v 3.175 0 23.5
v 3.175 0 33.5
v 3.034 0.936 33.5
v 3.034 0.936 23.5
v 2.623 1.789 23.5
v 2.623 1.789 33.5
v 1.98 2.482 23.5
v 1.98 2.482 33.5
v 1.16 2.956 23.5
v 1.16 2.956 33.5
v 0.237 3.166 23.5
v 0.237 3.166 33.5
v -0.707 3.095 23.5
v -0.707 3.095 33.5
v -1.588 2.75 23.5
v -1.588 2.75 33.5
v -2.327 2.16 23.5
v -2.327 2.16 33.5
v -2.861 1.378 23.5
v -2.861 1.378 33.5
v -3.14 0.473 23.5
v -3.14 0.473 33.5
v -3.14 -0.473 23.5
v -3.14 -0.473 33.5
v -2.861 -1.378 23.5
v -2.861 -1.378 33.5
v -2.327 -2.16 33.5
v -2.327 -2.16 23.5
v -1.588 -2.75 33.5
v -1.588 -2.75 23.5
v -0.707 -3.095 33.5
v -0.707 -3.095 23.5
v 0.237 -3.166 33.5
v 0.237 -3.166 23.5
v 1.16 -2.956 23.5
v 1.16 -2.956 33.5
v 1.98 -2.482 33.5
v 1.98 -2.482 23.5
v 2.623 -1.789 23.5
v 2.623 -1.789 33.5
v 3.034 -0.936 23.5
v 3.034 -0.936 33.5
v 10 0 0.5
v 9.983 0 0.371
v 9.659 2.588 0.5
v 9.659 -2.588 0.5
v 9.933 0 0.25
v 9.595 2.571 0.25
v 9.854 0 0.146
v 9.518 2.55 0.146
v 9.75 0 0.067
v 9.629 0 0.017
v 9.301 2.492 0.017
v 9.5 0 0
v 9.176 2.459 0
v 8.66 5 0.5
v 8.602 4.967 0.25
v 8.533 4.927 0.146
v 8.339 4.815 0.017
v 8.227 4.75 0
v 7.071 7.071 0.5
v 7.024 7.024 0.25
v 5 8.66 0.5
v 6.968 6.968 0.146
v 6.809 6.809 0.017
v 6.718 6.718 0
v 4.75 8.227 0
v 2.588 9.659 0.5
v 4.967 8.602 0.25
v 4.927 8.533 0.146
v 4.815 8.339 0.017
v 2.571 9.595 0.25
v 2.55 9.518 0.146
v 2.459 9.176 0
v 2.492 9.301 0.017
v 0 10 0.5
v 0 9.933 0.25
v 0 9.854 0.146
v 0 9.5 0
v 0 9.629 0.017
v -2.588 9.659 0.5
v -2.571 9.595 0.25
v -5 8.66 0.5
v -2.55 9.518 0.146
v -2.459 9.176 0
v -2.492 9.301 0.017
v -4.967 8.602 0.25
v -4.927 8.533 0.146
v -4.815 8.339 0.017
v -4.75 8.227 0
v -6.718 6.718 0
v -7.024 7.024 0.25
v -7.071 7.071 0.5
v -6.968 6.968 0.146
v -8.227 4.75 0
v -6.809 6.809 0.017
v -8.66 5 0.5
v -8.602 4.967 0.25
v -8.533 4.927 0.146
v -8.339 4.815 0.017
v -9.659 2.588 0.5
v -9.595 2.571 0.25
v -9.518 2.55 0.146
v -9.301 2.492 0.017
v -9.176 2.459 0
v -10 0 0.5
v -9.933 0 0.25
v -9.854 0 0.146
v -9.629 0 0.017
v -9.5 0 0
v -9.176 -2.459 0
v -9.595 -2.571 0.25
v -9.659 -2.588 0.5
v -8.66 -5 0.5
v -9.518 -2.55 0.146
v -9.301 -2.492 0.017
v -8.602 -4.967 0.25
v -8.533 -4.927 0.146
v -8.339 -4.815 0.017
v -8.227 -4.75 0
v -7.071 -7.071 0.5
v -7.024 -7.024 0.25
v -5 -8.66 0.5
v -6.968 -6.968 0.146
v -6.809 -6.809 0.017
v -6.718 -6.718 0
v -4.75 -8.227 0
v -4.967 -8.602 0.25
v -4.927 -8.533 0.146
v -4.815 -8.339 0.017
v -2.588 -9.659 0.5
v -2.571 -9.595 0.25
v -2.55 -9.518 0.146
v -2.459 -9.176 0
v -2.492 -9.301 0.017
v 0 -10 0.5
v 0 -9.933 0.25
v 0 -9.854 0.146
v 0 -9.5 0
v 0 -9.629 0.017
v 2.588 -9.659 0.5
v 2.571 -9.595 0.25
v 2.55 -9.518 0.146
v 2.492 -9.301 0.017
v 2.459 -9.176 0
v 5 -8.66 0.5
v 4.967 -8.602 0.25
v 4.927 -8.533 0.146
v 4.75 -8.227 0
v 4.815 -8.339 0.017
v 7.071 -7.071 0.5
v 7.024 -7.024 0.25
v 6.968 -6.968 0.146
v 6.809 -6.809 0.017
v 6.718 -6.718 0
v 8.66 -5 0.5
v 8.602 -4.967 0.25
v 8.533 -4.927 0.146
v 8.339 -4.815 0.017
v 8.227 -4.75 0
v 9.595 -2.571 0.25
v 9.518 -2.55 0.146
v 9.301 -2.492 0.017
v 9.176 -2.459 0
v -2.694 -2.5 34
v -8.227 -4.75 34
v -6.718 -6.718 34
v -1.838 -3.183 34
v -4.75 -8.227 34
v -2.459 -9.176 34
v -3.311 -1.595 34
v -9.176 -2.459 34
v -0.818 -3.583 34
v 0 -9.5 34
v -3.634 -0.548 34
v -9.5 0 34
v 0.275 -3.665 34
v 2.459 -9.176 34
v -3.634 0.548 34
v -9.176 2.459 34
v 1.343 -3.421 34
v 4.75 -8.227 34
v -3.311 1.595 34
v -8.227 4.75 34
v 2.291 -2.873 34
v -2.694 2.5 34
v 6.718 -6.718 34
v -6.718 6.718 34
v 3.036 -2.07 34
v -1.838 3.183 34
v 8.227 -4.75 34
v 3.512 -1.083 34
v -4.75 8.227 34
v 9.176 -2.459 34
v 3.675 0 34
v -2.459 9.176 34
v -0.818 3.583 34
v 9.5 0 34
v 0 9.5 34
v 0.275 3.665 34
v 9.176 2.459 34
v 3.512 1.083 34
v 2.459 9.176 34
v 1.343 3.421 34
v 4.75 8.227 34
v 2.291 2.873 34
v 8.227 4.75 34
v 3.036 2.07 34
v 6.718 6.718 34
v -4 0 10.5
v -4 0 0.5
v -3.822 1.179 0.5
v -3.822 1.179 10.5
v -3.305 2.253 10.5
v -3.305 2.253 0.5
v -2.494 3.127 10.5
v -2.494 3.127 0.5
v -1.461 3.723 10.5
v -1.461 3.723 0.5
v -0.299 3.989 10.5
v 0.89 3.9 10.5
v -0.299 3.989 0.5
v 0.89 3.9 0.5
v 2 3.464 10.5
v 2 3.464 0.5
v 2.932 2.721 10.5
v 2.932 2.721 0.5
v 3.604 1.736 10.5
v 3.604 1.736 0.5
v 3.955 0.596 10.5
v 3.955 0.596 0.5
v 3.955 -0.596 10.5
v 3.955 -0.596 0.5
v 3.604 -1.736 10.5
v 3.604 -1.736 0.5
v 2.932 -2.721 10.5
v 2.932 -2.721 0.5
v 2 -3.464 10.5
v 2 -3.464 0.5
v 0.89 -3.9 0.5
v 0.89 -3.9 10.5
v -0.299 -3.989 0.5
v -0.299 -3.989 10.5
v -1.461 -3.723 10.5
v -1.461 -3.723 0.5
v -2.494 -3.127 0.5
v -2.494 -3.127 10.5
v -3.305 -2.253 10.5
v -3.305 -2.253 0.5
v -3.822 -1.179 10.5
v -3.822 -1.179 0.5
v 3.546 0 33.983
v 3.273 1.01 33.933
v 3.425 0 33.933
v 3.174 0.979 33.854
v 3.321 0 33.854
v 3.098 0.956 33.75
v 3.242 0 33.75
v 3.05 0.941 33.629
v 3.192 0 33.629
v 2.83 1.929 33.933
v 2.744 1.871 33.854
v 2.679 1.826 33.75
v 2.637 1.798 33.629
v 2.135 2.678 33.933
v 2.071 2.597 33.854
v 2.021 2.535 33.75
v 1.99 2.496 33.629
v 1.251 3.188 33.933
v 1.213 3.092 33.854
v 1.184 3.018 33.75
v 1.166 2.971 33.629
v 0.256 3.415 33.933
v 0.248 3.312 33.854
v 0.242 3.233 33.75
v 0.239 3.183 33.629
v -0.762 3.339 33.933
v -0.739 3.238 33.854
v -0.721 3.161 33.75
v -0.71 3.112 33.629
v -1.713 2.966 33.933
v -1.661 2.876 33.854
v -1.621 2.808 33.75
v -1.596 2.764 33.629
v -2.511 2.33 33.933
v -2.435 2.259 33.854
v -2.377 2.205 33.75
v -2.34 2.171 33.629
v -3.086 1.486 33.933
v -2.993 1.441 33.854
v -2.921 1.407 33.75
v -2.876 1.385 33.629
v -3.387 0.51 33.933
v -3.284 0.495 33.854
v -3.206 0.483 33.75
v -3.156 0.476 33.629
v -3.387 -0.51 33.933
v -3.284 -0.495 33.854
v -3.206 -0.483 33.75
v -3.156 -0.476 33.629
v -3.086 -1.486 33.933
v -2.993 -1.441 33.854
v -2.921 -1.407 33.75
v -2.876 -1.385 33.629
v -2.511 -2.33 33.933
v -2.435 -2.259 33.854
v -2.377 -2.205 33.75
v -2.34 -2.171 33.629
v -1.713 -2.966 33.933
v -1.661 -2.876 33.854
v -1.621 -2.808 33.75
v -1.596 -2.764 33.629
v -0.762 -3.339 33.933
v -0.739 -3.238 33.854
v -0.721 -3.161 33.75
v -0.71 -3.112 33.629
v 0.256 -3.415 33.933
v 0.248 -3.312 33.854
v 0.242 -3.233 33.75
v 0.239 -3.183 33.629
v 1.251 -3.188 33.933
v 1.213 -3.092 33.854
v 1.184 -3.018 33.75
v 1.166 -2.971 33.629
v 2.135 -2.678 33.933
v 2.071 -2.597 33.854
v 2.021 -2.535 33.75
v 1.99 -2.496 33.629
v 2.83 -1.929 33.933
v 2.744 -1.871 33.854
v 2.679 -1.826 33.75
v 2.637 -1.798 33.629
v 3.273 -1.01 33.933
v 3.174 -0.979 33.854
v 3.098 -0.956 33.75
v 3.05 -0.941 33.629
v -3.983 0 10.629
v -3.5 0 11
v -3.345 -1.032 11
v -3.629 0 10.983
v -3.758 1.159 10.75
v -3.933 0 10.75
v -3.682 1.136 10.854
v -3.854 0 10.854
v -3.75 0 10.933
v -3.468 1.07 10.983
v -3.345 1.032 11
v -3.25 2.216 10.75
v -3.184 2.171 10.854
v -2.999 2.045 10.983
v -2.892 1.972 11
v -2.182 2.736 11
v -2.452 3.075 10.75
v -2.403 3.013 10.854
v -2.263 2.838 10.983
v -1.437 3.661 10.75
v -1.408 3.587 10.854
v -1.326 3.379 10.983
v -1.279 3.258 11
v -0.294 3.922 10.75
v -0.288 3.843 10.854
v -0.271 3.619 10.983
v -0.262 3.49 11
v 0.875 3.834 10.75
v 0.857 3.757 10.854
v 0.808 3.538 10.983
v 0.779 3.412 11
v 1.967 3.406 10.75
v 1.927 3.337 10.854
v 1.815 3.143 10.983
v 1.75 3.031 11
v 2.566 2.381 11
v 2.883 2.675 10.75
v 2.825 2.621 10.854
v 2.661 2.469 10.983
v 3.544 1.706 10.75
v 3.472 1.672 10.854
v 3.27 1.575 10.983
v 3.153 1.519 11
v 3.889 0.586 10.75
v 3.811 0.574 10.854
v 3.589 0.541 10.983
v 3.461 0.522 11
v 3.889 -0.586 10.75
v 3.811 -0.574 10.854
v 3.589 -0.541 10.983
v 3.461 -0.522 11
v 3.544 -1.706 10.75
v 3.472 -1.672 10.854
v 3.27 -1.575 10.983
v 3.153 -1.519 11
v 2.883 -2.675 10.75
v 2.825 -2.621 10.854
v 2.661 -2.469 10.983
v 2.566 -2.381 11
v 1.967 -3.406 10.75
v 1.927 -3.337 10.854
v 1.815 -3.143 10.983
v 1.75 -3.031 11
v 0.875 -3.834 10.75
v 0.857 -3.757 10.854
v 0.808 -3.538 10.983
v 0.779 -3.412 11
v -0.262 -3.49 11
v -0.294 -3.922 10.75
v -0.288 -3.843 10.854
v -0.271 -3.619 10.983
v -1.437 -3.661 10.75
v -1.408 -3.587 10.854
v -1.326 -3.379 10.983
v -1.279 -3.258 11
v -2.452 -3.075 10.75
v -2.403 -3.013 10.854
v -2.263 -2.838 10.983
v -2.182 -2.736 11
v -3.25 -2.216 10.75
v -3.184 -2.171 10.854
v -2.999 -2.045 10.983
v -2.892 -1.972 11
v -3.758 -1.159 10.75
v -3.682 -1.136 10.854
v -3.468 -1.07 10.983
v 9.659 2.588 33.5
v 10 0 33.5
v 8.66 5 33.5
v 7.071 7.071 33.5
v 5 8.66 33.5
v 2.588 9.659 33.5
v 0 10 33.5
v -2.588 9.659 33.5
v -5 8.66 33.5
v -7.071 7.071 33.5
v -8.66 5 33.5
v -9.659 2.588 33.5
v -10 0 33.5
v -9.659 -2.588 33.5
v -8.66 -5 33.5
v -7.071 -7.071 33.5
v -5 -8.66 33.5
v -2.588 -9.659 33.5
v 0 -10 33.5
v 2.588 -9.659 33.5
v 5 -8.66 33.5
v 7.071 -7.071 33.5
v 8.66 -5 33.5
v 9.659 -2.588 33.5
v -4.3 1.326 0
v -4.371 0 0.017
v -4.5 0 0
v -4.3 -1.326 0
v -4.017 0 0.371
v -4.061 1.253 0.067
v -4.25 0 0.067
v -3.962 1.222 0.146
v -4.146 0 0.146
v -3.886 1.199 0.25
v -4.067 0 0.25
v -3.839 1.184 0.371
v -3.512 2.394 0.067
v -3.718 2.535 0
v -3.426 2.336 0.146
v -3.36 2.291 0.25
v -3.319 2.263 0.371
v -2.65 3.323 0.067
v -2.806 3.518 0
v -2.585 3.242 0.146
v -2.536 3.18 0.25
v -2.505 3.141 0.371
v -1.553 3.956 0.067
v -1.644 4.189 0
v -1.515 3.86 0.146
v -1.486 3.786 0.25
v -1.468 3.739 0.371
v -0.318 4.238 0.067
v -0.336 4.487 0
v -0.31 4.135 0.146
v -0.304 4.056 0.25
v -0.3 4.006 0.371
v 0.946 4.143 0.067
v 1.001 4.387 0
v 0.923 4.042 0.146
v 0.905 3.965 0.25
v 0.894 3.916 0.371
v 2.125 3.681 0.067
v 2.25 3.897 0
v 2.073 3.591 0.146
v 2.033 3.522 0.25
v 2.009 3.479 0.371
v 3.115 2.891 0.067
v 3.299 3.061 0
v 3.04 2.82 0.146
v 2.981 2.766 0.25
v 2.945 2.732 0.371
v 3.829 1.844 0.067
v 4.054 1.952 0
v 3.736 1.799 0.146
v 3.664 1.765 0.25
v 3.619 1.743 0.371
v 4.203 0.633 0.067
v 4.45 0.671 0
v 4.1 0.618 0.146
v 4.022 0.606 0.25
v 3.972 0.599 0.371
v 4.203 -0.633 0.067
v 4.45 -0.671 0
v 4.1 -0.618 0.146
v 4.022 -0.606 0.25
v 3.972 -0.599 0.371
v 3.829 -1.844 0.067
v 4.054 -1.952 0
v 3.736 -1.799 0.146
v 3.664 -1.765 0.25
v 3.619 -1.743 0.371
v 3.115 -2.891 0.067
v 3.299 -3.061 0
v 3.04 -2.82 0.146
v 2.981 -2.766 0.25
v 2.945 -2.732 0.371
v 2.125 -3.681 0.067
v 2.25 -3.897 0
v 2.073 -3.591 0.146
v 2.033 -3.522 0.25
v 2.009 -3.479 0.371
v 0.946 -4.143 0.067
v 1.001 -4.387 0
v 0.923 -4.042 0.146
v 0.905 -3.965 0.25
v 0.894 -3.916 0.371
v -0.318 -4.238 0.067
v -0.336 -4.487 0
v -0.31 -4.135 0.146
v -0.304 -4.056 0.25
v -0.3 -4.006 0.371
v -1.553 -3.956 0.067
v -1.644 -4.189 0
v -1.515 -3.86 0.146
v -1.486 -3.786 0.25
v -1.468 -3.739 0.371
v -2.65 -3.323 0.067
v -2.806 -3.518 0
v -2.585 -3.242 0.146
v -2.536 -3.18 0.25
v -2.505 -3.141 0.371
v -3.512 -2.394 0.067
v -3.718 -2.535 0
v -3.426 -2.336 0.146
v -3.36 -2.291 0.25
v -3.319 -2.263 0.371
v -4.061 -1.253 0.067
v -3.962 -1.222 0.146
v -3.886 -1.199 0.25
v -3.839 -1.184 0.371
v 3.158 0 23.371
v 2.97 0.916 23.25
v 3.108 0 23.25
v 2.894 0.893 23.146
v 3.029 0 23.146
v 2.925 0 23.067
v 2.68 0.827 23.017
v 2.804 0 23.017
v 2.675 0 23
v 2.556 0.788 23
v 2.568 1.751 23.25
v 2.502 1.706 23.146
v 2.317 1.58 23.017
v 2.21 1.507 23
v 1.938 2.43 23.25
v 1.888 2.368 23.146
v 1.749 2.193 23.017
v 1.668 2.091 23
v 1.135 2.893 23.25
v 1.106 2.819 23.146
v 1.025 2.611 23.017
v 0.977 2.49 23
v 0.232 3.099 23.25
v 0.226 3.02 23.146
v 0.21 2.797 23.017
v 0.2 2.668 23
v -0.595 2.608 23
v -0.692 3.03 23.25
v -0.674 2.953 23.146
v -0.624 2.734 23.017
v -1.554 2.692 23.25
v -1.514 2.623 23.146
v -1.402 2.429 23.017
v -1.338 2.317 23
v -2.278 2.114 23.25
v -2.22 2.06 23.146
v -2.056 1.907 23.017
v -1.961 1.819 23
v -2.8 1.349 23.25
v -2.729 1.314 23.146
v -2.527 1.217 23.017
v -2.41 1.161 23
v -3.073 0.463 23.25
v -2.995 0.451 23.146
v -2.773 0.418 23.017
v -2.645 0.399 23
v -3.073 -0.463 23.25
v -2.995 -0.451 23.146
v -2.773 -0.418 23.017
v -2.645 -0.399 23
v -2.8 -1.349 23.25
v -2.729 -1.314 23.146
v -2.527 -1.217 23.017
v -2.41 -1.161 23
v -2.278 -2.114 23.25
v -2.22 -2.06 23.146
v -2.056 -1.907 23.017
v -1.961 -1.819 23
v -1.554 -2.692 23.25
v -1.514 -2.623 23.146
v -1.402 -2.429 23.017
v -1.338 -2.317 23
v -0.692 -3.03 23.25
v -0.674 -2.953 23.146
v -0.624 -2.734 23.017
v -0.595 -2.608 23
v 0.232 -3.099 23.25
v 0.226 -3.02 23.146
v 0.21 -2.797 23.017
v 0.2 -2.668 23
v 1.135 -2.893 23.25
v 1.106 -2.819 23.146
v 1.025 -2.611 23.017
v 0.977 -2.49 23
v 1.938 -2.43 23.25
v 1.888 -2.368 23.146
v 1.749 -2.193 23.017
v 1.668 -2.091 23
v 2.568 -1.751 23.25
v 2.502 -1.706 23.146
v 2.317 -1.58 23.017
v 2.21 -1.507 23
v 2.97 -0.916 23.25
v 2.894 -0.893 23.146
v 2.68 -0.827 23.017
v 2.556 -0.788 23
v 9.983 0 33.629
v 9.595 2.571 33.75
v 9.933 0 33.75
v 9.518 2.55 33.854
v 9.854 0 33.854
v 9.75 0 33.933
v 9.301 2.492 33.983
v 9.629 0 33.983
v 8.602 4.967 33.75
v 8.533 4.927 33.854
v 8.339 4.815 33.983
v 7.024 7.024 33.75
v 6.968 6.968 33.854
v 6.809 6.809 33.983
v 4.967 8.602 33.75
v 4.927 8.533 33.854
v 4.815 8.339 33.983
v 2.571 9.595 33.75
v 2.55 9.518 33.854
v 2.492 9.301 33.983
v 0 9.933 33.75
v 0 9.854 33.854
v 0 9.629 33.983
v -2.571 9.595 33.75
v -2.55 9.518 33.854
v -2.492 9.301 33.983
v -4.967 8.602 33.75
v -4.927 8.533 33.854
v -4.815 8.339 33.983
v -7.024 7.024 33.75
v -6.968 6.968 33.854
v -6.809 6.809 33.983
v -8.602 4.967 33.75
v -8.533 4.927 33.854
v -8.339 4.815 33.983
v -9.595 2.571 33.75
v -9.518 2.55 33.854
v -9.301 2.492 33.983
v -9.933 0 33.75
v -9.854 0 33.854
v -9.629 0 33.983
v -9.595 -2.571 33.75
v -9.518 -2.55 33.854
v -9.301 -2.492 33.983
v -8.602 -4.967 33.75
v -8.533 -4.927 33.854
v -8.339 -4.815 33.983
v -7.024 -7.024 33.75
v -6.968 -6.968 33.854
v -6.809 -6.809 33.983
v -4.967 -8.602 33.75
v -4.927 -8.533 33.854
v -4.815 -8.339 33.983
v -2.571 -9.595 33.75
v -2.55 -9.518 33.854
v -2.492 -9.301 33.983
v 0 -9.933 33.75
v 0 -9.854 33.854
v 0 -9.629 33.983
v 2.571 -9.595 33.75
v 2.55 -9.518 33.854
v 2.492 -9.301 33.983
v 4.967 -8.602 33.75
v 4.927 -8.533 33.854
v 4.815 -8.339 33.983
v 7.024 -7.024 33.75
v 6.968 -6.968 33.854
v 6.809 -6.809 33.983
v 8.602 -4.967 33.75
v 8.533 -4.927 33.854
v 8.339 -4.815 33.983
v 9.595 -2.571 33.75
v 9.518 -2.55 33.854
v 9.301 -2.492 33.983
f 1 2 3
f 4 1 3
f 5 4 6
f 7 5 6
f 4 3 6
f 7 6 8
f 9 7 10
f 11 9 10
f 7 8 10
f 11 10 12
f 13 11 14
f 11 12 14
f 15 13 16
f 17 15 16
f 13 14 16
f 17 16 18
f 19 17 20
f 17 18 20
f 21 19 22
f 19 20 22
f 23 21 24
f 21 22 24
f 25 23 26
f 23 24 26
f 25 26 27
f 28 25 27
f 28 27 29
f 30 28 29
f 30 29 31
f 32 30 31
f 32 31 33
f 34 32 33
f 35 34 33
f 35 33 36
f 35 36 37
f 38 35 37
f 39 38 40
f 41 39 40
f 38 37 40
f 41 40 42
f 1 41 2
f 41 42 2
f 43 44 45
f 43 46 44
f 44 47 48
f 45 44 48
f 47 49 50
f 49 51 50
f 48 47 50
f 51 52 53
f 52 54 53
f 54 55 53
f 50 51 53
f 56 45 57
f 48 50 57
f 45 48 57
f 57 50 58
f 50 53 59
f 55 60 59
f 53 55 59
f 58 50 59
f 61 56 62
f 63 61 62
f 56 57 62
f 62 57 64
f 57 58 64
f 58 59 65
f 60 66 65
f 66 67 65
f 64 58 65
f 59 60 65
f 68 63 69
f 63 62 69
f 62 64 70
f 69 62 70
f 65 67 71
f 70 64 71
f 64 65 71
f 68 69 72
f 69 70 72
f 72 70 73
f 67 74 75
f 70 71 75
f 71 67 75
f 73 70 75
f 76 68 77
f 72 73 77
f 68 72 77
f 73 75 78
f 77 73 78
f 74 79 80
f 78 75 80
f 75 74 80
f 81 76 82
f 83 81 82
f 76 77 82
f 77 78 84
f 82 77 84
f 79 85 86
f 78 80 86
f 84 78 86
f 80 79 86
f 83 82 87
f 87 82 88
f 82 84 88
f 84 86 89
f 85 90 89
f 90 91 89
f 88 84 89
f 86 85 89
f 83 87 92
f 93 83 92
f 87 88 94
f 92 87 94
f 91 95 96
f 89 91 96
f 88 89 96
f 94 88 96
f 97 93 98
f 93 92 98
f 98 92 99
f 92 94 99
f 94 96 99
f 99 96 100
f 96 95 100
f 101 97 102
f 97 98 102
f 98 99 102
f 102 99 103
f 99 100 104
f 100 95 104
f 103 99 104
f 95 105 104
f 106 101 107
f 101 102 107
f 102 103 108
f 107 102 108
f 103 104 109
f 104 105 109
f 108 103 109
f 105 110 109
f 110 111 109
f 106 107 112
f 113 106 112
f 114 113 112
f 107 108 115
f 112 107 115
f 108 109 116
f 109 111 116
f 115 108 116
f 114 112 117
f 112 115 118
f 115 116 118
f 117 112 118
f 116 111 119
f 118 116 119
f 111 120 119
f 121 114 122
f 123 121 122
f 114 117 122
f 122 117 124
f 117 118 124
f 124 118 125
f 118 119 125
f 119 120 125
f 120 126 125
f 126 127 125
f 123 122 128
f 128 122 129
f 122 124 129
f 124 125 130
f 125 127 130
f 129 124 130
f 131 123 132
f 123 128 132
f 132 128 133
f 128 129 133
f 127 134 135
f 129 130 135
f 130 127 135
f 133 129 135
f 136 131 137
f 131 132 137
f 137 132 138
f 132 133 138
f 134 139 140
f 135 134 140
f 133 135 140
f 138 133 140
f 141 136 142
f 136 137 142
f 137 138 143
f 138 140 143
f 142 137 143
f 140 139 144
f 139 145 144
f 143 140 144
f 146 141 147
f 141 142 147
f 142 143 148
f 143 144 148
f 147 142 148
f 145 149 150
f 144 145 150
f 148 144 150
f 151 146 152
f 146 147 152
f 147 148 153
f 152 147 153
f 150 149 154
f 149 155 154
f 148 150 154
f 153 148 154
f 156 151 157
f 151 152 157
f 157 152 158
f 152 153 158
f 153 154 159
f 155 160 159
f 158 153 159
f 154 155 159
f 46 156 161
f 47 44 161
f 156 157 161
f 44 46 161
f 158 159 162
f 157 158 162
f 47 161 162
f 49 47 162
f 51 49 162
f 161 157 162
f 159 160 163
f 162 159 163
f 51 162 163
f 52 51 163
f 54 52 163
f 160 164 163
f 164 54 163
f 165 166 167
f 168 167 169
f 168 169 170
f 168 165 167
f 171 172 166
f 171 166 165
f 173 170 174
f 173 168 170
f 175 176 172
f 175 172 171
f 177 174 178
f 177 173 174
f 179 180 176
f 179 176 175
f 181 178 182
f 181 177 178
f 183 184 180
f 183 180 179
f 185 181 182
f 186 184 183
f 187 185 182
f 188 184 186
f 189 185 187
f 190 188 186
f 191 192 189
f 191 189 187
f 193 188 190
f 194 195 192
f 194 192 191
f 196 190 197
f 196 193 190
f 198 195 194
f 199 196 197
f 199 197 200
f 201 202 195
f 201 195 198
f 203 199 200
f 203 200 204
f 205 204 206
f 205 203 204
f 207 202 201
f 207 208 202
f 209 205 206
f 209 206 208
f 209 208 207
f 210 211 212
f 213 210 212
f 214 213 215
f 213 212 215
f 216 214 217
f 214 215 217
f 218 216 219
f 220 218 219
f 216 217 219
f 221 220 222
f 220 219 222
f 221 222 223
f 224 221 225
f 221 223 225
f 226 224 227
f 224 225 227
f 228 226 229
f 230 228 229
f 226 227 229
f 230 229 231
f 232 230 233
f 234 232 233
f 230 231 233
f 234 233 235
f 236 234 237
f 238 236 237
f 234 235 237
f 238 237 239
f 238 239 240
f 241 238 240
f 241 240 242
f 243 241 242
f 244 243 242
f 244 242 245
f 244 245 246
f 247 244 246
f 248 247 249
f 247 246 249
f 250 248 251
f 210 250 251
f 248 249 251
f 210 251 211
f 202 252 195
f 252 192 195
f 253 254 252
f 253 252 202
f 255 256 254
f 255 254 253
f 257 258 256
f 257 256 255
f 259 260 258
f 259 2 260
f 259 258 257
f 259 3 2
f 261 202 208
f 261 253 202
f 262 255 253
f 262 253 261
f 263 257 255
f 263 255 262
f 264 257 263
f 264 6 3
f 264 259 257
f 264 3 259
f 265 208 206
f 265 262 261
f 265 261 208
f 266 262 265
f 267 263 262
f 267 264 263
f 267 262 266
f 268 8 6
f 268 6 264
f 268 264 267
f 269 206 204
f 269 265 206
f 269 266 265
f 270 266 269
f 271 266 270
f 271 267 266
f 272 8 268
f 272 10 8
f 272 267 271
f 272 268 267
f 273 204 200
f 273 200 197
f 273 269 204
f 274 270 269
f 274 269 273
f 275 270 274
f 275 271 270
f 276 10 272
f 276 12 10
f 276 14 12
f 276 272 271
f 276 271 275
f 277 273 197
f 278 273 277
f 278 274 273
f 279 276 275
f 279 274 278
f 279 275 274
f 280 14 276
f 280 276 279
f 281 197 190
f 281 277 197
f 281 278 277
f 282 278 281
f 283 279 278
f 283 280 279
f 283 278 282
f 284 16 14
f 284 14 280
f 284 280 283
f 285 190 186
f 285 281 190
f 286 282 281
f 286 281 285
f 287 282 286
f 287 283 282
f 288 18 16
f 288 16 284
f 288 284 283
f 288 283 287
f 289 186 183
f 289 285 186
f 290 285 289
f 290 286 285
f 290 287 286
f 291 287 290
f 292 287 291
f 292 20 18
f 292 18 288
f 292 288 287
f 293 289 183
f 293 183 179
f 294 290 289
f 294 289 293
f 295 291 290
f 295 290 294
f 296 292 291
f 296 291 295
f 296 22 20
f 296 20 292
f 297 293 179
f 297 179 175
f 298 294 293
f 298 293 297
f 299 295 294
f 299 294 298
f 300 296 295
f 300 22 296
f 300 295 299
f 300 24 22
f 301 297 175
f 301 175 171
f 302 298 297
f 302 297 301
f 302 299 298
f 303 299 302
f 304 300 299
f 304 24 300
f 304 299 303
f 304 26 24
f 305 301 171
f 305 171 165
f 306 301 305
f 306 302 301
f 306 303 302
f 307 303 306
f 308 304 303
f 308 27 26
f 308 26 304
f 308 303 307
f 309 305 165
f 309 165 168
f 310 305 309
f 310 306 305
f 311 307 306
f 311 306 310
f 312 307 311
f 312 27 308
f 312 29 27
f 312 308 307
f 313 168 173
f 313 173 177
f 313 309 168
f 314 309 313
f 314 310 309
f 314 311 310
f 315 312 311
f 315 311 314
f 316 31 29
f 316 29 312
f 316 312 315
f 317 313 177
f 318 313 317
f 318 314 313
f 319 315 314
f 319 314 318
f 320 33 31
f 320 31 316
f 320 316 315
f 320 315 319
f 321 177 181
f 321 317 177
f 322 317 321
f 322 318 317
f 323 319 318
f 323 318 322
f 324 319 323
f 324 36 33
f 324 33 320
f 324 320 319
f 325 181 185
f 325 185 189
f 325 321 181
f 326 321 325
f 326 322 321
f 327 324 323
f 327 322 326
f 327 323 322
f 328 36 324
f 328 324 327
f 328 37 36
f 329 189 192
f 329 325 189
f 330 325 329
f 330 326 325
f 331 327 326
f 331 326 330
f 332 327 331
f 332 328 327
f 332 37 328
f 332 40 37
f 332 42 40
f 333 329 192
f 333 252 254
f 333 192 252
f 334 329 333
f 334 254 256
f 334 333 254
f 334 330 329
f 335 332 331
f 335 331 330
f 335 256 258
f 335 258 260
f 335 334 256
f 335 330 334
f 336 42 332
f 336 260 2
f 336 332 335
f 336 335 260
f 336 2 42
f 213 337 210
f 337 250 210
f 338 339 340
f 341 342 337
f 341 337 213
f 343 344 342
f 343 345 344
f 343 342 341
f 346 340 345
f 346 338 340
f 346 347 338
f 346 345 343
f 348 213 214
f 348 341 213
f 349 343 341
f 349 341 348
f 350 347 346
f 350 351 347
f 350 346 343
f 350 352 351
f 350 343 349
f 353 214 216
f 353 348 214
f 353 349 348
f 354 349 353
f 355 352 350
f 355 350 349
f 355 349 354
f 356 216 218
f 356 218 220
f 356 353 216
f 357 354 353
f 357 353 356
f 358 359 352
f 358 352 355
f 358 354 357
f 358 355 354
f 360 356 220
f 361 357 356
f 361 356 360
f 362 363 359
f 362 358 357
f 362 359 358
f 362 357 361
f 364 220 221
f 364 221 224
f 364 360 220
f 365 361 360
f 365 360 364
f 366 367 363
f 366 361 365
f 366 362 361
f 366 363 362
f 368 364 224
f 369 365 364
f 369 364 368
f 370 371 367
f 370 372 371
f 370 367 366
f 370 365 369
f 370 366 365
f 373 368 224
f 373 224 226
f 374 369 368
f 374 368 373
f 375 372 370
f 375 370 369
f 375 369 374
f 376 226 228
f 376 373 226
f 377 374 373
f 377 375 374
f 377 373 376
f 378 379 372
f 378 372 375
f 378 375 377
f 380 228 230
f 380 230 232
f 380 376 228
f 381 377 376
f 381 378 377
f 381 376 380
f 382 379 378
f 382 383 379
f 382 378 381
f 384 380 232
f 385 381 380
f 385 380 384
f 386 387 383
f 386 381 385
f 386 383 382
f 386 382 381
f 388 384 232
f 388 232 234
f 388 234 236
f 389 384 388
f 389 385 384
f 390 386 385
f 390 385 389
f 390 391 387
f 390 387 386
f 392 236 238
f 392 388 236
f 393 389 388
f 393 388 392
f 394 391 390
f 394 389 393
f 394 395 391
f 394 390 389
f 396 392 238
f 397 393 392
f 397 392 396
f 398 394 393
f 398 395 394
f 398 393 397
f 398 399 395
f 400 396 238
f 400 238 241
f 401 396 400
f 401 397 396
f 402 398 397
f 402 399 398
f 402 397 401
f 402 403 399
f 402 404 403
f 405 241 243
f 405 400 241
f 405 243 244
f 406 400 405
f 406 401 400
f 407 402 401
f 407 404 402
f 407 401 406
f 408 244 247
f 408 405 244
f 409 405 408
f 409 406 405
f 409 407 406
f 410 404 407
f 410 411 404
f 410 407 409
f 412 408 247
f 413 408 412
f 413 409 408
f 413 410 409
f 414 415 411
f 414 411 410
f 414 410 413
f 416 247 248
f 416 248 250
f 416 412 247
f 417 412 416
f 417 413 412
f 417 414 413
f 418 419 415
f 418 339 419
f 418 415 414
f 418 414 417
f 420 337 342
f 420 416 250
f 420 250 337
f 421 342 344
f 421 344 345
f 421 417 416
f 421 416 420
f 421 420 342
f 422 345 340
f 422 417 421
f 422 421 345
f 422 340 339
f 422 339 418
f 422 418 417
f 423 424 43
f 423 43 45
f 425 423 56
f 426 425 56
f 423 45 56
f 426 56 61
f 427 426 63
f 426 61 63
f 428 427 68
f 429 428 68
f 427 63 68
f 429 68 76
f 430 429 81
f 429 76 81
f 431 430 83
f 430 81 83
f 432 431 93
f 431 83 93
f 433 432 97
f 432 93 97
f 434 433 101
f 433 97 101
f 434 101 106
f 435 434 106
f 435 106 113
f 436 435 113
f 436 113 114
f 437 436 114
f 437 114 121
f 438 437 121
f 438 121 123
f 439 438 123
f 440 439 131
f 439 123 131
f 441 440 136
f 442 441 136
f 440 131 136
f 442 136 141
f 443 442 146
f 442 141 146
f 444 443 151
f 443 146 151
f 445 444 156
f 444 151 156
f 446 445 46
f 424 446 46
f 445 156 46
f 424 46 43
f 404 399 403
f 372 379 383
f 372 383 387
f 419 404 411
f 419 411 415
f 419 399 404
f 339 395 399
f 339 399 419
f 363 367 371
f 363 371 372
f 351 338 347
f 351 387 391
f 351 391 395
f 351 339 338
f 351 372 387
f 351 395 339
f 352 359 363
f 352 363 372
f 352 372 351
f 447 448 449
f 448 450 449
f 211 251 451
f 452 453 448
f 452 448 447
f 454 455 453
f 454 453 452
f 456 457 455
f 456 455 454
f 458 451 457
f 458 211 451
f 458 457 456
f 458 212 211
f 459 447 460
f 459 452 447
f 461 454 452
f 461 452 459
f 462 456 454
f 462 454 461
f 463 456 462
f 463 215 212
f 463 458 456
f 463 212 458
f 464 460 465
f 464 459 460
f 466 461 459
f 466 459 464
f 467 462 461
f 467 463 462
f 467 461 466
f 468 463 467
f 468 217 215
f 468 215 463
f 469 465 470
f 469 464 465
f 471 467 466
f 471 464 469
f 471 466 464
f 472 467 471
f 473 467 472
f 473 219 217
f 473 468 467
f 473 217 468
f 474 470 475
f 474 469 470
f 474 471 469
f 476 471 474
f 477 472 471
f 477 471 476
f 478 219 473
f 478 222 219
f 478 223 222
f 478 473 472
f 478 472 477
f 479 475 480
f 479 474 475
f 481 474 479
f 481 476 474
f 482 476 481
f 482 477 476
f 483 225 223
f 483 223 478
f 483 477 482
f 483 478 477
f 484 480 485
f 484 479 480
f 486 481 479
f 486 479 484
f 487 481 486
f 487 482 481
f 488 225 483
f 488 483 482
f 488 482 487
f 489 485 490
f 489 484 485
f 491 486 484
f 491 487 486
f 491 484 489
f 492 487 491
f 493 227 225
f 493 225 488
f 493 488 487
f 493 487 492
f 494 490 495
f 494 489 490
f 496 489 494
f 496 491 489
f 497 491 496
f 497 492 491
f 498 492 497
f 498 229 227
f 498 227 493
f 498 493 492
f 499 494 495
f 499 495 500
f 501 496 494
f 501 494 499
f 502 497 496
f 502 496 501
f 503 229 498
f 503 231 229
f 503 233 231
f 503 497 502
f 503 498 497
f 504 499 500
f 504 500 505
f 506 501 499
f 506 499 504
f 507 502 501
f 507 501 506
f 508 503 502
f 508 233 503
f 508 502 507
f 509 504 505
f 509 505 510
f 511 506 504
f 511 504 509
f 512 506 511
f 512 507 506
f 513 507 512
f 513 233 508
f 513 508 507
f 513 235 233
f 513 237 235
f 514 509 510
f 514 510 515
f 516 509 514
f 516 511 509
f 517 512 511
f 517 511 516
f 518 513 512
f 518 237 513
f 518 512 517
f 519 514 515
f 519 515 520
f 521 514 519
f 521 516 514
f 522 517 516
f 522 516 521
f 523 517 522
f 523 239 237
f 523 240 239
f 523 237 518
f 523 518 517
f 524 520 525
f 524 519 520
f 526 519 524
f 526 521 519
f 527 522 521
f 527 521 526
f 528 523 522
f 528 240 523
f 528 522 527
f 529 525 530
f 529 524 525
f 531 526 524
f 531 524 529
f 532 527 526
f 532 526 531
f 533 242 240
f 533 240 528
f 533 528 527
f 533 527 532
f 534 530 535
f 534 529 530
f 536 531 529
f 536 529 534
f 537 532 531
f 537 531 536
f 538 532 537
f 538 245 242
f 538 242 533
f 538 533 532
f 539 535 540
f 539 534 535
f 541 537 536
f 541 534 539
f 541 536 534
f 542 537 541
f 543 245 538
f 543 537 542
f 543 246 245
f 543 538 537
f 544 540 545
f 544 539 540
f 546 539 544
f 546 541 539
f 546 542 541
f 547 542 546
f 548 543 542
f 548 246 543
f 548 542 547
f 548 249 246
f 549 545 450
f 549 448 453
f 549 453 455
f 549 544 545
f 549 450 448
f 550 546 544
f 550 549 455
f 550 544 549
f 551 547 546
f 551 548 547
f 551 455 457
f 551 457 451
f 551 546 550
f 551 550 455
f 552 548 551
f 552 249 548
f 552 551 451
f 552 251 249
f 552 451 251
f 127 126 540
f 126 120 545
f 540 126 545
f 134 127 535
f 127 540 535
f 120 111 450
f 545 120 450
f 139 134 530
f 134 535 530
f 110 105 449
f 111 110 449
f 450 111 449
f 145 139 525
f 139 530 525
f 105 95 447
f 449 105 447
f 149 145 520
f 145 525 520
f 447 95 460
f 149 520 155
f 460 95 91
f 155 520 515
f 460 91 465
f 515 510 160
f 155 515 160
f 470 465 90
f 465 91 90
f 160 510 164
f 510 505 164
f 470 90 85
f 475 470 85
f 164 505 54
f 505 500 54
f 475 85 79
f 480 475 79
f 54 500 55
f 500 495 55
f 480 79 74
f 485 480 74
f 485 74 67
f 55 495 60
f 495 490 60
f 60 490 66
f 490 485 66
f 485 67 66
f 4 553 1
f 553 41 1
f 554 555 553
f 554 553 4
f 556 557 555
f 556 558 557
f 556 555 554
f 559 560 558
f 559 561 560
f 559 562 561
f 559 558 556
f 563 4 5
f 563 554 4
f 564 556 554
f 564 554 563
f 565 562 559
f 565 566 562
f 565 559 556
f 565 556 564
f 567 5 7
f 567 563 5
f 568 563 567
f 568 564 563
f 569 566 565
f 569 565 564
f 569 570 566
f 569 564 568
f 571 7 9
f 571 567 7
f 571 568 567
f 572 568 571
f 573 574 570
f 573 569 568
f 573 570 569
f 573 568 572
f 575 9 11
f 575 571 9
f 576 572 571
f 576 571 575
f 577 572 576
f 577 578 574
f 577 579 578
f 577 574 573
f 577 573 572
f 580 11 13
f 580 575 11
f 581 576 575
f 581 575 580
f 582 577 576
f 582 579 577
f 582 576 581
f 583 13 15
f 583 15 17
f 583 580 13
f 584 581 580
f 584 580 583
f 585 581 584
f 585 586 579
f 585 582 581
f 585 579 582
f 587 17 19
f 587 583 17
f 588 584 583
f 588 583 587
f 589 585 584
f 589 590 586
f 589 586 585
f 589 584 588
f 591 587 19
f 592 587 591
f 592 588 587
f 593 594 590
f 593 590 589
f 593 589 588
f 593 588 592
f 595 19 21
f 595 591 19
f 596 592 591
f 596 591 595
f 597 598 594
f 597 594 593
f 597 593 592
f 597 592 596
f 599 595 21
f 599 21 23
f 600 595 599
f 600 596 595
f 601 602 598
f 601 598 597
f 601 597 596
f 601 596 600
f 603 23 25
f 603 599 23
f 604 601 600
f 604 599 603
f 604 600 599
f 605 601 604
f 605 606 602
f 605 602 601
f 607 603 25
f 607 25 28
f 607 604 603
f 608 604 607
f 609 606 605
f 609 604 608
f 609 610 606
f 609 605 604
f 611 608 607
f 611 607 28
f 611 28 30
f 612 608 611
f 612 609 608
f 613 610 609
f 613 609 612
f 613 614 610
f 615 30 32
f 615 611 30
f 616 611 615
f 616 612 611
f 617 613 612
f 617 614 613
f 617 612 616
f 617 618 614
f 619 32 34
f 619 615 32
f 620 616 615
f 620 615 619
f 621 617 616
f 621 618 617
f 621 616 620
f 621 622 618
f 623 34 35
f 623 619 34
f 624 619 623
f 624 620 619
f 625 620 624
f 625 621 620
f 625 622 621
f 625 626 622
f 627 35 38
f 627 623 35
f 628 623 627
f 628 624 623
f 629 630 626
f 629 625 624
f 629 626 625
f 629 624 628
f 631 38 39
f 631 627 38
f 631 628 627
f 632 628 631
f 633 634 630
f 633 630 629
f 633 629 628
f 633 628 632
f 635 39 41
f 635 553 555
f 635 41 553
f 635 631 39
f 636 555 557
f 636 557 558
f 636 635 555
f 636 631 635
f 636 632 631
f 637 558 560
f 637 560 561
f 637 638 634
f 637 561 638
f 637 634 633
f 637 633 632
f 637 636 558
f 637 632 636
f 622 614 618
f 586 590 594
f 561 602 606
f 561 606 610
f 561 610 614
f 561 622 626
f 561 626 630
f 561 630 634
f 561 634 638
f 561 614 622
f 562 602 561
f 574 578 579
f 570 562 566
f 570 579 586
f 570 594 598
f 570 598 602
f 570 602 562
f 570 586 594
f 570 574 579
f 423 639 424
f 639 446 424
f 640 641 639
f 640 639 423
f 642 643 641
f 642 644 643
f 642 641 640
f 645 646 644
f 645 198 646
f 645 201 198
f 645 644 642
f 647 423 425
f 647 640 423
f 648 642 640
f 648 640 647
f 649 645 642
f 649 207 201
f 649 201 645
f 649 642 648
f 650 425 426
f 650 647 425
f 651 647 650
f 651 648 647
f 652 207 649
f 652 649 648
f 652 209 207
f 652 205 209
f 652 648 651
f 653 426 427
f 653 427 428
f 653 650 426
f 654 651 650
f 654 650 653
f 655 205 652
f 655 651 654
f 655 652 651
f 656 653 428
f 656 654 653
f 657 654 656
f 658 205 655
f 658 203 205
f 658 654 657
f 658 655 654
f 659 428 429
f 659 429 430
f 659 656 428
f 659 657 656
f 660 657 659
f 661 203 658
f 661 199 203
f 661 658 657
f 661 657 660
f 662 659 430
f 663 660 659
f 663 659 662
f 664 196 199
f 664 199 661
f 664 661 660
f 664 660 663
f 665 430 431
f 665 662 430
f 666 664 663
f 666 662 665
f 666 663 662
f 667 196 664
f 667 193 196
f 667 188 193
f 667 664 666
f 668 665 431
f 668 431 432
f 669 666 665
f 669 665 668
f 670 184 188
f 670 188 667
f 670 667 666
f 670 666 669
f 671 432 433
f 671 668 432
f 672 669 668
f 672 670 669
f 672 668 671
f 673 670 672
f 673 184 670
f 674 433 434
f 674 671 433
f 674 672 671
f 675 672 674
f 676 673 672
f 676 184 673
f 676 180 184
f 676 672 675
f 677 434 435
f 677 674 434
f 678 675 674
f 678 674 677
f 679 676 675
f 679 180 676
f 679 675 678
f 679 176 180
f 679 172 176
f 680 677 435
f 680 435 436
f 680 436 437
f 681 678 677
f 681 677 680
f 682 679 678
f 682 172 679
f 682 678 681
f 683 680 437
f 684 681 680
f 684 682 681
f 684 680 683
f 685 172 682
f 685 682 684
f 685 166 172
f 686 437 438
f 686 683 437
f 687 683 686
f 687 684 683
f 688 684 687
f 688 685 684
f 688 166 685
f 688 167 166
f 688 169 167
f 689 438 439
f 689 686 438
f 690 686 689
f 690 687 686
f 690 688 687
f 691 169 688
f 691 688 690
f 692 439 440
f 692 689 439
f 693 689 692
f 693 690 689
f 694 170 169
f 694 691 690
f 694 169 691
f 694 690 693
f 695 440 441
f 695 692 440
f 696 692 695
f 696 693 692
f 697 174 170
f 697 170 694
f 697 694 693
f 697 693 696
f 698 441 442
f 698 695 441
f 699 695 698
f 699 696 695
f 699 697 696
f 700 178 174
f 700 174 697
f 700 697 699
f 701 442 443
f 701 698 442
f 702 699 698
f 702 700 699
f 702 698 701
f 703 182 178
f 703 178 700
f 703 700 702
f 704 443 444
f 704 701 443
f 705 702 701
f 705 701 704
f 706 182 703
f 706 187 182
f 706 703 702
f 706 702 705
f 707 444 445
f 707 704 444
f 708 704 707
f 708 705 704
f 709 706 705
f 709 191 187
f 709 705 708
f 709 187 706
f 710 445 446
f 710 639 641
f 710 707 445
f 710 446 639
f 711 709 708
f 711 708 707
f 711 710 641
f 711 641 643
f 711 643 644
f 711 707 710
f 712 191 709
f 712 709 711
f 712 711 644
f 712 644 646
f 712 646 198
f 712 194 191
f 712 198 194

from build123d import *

# Parameters (mm, degrees)
SKETCH_1_R          = 10
EXTRUDE_1_DEPTH     = 34
SKETCH_2_R          = 3.175
CUT_EXTRUDE_1_DEPTH = 11
SKETCH_3_R          = 4
CUT_EXTRUDE_2_DEPTH = 11
FILLET_1_R          = 0.5
FILLET_2_R          = 0.5
FILLET_3_R          = 0.5


with BuildPart() as part:
    # Эскиз1 → Бобышка-Вытянуть1 (new body)
    with BuildSketch(Plane.XY):
        Circle(SKETCH_1_R)
    extrude(amount=EXTRUDE_1_DEPTH)

    # Эскиз2 → Вырез-Вытянуть1 (cut)
    with BuildSketch(Plane.XY.offset(34)):
        Circle(SKETCH_2_R)
    extrude(amount=-CUT_EXTRUDE_1_DEPTH, mode=Mode.SUBTRACT)

    # Эскиз3 → Вырез-Вытянуть2 (cut)
    with BuildSketch(Plane(origin=(0, 0, 0), x_dir=(-1, 0, 0), z_dir=(0, 0, -1))):
        Circle(SKETCH_3_R)
    extrude(amount=-CUT_EXTRUDE_2_DEPTH, mode=Mode.SUBTRACT)

    # Скругление1
    fillet_1_edges = [part.edges().sort_by_distance(p)[0] for p in [
        (-10, 0, 0),
        (-10, 0, 34),
    ]]
    fillet(fillet_1_edges, radius=FILLET_1_R)

    # Скругление2
    fillet_2_edges = [part.edges().sort_by_distance(p)[0] for p in [
        (4, 0, 0),
        (-3.175, 0, 34),
    ]]
    fillet(fillet_2_edges, radius=FILLET_2_R)

    # Скругление3
    fillet_3_edges = [part.edges().sort_by_distance(p)[0] for p in [
        (4, 0, 11),
        (-3.175, 0, 23),
    ]]
    fillet(fillet_3_edges, radius=FILLET_3_R)


solid = part.part
